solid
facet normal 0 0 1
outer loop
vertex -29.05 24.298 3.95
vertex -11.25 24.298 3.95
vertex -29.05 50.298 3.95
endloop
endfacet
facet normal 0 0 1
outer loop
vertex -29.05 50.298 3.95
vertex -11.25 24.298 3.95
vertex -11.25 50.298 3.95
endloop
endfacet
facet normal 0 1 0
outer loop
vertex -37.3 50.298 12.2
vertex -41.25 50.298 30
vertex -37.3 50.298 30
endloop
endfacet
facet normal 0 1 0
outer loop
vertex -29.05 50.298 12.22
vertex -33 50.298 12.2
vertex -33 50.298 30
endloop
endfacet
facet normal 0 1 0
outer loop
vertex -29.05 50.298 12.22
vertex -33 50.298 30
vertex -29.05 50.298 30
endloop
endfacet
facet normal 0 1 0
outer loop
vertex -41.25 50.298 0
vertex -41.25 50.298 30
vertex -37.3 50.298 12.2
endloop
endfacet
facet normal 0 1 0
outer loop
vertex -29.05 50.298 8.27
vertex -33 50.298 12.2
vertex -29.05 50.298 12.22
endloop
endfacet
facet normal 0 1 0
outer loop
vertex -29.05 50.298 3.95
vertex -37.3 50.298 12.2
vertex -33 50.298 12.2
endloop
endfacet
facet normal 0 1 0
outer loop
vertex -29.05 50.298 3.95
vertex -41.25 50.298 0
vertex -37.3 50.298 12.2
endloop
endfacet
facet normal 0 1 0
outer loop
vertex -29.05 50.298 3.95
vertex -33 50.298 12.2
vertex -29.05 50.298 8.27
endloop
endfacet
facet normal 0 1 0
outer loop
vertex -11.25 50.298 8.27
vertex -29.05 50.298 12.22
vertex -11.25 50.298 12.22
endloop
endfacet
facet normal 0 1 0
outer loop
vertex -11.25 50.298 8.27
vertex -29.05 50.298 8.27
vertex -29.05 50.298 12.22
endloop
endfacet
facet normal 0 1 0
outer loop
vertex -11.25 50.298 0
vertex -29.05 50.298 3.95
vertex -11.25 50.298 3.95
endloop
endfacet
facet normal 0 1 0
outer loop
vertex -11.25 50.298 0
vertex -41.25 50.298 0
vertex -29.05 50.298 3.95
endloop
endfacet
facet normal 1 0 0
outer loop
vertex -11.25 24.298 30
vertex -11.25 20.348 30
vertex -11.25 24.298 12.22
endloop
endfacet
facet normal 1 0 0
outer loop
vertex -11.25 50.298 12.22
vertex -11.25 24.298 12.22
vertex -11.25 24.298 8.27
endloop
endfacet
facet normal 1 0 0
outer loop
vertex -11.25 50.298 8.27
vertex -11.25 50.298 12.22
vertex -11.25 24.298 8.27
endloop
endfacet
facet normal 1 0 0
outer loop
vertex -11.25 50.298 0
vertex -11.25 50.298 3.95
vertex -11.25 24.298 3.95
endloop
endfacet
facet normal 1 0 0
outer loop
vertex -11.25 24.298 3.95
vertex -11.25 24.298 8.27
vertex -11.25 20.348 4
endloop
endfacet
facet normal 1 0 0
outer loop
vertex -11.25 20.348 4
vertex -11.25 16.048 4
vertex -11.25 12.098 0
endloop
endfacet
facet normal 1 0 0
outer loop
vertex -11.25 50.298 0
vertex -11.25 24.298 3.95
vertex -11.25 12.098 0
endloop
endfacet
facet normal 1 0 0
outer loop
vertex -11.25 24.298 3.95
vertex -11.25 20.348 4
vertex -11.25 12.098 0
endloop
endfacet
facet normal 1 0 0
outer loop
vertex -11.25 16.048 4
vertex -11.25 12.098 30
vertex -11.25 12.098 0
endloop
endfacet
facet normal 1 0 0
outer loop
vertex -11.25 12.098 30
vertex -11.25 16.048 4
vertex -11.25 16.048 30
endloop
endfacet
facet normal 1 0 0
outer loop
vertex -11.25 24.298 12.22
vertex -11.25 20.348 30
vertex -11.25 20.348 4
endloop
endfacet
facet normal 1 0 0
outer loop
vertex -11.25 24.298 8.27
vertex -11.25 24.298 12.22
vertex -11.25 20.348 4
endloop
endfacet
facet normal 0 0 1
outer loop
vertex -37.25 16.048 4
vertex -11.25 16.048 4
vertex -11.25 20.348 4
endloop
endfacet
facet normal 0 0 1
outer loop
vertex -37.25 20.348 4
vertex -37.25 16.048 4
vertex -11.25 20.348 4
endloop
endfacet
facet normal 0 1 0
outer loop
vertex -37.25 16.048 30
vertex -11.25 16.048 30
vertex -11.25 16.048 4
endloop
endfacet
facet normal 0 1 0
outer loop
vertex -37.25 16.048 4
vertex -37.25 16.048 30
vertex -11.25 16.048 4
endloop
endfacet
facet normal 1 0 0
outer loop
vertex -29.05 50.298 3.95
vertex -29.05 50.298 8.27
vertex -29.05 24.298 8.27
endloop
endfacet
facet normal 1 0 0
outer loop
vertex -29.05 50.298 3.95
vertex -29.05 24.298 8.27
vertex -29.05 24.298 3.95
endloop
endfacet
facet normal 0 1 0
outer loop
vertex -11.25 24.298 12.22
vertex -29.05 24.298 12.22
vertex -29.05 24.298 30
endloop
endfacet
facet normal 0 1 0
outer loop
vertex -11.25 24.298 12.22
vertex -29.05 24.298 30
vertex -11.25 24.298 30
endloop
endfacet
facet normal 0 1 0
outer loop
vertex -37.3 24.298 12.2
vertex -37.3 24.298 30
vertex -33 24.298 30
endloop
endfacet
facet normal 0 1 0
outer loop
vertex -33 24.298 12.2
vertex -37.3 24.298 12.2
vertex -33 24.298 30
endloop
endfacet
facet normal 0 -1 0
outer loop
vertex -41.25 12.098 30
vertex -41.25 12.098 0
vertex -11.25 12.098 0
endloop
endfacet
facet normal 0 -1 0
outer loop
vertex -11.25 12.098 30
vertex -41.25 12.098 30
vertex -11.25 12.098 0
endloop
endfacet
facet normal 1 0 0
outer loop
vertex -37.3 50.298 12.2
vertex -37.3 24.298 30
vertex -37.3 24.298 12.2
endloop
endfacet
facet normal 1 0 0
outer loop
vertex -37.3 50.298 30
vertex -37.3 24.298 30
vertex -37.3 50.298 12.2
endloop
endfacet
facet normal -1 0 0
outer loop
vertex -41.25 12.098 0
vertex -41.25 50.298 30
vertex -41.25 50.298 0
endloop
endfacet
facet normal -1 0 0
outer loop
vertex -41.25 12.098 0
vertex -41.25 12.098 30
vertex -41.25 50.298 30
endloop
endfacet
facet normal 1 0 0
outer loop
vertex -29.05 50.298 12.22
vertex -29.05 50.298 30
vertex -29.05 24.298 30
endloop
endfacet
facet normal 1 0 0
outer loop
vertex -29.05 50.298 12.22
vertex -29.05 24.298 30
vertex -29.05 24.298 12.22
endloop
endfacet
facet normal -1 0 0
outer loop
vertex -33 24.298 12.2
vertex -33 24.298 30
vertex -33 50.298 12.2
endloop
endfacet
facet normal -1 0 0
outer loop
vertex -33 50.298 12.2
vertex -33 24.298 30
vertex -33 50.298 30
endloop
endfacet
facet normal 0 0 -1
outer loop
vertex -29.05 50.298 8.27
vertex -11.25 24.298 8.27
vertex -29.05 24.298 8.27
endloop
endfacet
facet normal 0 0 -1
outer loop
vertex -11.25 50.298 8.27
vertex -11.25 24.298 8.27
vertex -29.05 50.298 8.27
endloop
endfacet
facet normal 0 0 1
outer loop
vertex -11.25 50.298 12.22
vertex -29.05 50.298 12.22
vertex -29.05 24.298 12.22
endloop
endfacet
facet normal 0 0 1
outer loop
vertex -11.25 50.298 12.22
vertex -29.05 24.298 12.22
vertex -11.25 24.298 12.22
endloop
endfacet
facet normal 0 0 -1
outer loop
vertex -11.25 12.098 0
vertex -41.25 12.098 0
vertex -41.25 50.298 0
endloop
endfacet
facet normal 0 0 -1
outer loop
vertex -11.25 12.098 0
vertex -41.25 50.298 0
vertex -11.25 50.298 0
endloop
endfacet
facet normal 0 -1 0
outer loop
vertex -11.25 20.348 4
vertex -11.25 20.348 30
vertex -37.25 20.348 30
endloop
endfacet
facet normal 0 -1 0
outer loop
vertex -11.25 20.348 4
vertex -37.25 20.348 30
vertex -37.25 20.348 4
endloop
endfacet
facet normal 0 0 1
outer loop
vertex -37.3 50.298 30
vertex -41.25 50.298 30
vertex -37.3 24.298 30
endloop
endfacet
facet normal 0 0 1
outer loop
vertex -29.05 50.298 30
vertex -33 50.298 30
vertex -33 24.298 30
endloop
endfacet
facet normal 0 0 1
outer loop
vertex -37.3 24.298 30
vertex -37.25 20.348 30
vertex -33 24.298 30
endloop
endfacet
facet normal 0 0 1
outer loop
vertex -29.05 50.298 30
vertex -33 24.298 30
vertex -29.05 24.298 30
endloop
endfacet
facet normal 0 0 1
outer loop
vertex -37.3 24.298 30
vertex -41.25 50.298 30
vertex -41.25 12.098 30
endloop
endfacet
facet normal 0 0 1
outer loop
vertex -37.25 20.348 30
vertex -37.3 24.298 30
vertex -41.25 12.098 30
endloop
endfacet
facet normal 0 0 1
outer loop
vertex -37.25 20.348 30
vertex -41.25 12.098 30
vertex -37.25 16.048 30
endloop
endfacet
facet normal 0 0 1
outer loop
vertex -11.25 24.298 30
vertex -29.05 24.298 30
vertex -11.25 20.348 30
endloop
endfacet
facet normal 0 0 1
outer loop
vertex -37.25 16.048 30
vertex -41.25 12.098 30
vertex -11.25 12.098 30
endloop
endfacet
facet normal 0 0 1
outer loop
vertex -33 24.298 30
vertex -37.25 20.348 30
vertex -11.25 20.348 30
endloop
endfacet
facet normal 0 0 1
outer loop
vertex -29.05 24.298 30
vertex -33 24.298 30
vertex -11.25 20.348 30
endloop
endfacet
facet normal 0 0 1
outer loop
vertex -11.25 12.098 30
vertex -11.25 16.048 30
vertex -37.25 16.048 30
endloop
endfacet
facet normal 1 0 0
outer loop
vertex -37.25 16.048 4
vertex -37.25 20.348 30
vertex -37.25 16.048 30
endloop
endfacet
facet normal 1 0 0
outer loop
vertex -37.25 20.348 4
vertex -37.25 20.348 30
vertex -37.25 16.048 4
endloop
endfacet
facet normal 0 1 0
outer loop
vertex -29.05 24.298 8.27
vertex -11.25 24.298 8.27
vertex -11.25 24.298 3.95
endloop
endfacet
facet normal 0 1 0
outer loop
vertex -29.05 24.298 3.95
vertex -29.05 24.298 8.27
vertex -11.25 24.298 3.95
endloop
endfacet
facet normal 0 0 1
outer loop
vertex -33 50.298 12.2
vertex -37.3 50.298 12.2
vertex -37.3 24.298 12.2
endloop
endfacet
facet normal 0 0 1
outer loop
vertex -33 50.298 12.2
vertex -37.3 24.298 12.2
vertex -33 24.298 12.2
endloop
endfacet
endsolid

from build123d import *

# Parameters (mm, degrees)
SKETCH1_W           = 30
SKETCH1_H           = 12.2
BOSS_EXTRUDE1_DEPTH = 30
SKETCH2_W           = 26
SKETCH2_H           = 4.3
CUT_EXTRUDE1_DEPTH  = 26
SKETCH3_W           = 30
SKETCH3_H           = 30
BOSS_EXTRUDE2_DEPTH = 26
SKETCH4_W           = 17.8
SKETCH4_H           = 17.78
CUT_EXTRUDE2_DEPTH  = 26
SKETCH6_W           = 4.32
SKETCH6_H           = 26
CUT_EXTRUDE3_DEPTH  = 17.8
SKETCH9_W           = 4.3
SKETCH9_H           = 26
CUT_EXTRUDE4_DEPTH  = 17.8


with BuildPart() as part:
    # Sketch1 → Boss-Extrude1 (new body)
    with BuildSketch(Plane.XY):
        with Locations((-26.249929658, 18.197752809)):
            Rectangle(SKETCH1_W, SKETCH1_H)
    extrude(amount=BOSS_EXTRUDE1_DEPTH)

    # Sketch2 → Cut-Extrude1 (cut)
    with BuildSketch(Plane(origin=(-11.249929658, 0, 0), x_dir=(0, 0, -1), z_dir=(1, 0, 0))):
        with Locations((-17, 18.197752809)):
            Rectangle(SKETCH2_W, SKETCH2_H)
    extrude(amount=-CUT_EXTRUDE1_DEPTH, mode=Mode.SUBTRACT)

    # Sketch3 → Boss-Extrude2 (add)
    with BuildSketch(Plane(origin=(0, 24.297752809, 0), x_dir=(1, 0, 0), z_dir=(0, 1, 0))):
        with Locations((-26.249929658, -15)):
            Rectangle(SKETCH3_W, SKETCH3_H)
    extrude(amount=BOSS_EXTRUDE2_DEPTH)

    # Sketch4 → Cut-Extrude2 (cut)
    with BuildSketch(Plane(origin=(0, 50.297752809, 0), x_dir=(1, 0, 0), z_dir=(0, 1, 0))):
        with Locations((-20.149929658, -21.11)):
            Rectangle(SKETCH4_W, SKETCH4_H)
    extrude(amount=-CUT_EXTRUDE2_DEPTH, mode=Mode.SUBTRACT)

    # Sketch6 → Cut-Extrude3 (cut)
    with BuildSketch(Plane(origin=(-11.249929658, 0, 0), x_dir=(0, 0, -1), z_dir=(1, 0, 0))):
        with Locations((-6.11, 37.297752809)):
            Rectangle(SKETCH6_W, SKETCH6_H)
    extrude(amount=-CUT_EXTRUDE3_DEPTH, mode=Mode.SUBTRACT)

    # Sketch9 → Cut-Extrude4 (cut)
    with BuildSketch(Plane.XY.offset(30)):
        with Locations((-35.149929658, 37.297752809)):
            Rectangle(SKETCH9_W, SKETCH9_H)
    extrude(amount=-CUT_EXTRUDE4_DEPTH, mode=Mode.SUBTRACT)


solid = part.part
